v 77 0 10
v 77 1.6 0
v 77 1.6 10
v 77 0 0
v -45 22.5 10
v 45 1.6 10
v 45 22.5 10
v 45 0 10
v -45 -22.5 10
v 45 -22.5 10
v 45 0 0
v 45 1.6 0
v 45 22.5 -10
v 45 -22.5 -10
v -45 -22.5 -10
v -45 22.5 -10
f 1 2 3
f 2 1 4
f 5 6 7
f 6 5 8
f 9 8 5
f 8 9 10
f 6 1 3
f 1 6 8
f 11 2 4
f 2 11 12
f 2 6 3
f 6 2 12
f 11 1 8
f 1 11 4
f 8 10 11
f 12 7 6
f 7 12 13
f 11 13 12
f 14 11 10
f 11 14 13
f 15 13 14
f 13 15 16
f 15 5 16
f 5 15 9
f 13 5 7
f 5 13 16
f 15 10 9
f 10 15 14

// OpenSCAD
// Dimensions for the Drying Rack
// Base Block Dimensions
base_length = 90;  // Length of the base block along X axis (mm)
base_width = 45;    // Width of the base block along Y axis (mm)
base_height = 20;   // Height of the base block along Z axis (mm)

// Slide Slot Dimensions
num_slots = 10;     // Number of slots to create
slot_length = 77;   // Length of each slot along X axis (mm)
slot_width = 1.6;    // Width of each slot along Y axis (mm)
slot_depth = 10;     // Depth of the slot along Z axis (mm)
slot_spacing = 3.5;  // Center-to-center spacing between slots in Y direction (mm)

// Slot Positioning Calculations
// The slots are centered on the block in X and Y.

// Calculate the total required width for the slots and gaps:
// Total space occupied by slots: num_slots * slot_width
// Total space occupied by gaps: (num_slots - 1) * slot_spacing
// Since spacing is center-to-center, we need to consider the centers.

// Center of the block in Y: base_width / 2 = 45 / 2 = 22.5
y_center = base_width / 2;

// Calculate the starting position for the first slot's center (relative to origin)
// We want the group centered at y_center.
// The centers of the slots will be: y_center - (num_slots - 1) * (slot_spacing / 2)
y_offset = (num_slots - 1) * (slot_spacing / 2);
slot_centers = [y_center - y_offset + (slot_width / 2),
                y_center - y_offset + 3 * (slot_spacing / 2),
                y_center - y_offset + 5 * (slot_spacing / 2),
                y_center - y_offset + 7 * (slot_spacing / 2),
                y_center - y_offset + 9 * (slot_spacing / 2),
                y_center - y_offset + 11 * (slot_spacing / 2),
                y_center - y_offset + 13 * (slot_spacing / 2),
                y_center - y_offset + 15 * (slot_spacing / 2),
                y_center - y_offset + 17 * (slot_spacing / 2),
                y_center - y_offset + 19 * (slot_spacing / 2)];

// Adjusting the calculation to ensure the entire group is centered around y_center.
// Let's define the total span of the slots: (num_slots - 1) * slot_spacing + slot_width
total_span = (num_slots - 1) * slot_spacing + slot_width;
start_y = y_center - (total_span / 2);

slot_positions = [];
for (i = [0 : num_slots - 1]) {
    // Center of the i-th slot: start_y + i * slot_spacing + slot_width / 2
    pos = start_y + i * slot_spacing + (slot_width / 2);
    slot_positions = concat(slot_positions, [pos]);
}


// --- Main Model ---

module drying_rack() {
    // 1. Base Block (Cuboid)
    cube([base_length, base_width, base_height], center = true);

    // 2. Slots (Cutouts)
    for (i = [0 : num_slots - 1]) {
        slot_y = slot_positions[i];

        // Create the slot using a moving cube/box for extrusion along Z
        translate([0, slot_y, 0]) {
            // The slot runs along X (length=77), has width=1.6 (Y), and depth=10 (Z)
            cube([slot_length, slot_width, slot_depth], center = false);
        }
    }
}

drying_rack();
